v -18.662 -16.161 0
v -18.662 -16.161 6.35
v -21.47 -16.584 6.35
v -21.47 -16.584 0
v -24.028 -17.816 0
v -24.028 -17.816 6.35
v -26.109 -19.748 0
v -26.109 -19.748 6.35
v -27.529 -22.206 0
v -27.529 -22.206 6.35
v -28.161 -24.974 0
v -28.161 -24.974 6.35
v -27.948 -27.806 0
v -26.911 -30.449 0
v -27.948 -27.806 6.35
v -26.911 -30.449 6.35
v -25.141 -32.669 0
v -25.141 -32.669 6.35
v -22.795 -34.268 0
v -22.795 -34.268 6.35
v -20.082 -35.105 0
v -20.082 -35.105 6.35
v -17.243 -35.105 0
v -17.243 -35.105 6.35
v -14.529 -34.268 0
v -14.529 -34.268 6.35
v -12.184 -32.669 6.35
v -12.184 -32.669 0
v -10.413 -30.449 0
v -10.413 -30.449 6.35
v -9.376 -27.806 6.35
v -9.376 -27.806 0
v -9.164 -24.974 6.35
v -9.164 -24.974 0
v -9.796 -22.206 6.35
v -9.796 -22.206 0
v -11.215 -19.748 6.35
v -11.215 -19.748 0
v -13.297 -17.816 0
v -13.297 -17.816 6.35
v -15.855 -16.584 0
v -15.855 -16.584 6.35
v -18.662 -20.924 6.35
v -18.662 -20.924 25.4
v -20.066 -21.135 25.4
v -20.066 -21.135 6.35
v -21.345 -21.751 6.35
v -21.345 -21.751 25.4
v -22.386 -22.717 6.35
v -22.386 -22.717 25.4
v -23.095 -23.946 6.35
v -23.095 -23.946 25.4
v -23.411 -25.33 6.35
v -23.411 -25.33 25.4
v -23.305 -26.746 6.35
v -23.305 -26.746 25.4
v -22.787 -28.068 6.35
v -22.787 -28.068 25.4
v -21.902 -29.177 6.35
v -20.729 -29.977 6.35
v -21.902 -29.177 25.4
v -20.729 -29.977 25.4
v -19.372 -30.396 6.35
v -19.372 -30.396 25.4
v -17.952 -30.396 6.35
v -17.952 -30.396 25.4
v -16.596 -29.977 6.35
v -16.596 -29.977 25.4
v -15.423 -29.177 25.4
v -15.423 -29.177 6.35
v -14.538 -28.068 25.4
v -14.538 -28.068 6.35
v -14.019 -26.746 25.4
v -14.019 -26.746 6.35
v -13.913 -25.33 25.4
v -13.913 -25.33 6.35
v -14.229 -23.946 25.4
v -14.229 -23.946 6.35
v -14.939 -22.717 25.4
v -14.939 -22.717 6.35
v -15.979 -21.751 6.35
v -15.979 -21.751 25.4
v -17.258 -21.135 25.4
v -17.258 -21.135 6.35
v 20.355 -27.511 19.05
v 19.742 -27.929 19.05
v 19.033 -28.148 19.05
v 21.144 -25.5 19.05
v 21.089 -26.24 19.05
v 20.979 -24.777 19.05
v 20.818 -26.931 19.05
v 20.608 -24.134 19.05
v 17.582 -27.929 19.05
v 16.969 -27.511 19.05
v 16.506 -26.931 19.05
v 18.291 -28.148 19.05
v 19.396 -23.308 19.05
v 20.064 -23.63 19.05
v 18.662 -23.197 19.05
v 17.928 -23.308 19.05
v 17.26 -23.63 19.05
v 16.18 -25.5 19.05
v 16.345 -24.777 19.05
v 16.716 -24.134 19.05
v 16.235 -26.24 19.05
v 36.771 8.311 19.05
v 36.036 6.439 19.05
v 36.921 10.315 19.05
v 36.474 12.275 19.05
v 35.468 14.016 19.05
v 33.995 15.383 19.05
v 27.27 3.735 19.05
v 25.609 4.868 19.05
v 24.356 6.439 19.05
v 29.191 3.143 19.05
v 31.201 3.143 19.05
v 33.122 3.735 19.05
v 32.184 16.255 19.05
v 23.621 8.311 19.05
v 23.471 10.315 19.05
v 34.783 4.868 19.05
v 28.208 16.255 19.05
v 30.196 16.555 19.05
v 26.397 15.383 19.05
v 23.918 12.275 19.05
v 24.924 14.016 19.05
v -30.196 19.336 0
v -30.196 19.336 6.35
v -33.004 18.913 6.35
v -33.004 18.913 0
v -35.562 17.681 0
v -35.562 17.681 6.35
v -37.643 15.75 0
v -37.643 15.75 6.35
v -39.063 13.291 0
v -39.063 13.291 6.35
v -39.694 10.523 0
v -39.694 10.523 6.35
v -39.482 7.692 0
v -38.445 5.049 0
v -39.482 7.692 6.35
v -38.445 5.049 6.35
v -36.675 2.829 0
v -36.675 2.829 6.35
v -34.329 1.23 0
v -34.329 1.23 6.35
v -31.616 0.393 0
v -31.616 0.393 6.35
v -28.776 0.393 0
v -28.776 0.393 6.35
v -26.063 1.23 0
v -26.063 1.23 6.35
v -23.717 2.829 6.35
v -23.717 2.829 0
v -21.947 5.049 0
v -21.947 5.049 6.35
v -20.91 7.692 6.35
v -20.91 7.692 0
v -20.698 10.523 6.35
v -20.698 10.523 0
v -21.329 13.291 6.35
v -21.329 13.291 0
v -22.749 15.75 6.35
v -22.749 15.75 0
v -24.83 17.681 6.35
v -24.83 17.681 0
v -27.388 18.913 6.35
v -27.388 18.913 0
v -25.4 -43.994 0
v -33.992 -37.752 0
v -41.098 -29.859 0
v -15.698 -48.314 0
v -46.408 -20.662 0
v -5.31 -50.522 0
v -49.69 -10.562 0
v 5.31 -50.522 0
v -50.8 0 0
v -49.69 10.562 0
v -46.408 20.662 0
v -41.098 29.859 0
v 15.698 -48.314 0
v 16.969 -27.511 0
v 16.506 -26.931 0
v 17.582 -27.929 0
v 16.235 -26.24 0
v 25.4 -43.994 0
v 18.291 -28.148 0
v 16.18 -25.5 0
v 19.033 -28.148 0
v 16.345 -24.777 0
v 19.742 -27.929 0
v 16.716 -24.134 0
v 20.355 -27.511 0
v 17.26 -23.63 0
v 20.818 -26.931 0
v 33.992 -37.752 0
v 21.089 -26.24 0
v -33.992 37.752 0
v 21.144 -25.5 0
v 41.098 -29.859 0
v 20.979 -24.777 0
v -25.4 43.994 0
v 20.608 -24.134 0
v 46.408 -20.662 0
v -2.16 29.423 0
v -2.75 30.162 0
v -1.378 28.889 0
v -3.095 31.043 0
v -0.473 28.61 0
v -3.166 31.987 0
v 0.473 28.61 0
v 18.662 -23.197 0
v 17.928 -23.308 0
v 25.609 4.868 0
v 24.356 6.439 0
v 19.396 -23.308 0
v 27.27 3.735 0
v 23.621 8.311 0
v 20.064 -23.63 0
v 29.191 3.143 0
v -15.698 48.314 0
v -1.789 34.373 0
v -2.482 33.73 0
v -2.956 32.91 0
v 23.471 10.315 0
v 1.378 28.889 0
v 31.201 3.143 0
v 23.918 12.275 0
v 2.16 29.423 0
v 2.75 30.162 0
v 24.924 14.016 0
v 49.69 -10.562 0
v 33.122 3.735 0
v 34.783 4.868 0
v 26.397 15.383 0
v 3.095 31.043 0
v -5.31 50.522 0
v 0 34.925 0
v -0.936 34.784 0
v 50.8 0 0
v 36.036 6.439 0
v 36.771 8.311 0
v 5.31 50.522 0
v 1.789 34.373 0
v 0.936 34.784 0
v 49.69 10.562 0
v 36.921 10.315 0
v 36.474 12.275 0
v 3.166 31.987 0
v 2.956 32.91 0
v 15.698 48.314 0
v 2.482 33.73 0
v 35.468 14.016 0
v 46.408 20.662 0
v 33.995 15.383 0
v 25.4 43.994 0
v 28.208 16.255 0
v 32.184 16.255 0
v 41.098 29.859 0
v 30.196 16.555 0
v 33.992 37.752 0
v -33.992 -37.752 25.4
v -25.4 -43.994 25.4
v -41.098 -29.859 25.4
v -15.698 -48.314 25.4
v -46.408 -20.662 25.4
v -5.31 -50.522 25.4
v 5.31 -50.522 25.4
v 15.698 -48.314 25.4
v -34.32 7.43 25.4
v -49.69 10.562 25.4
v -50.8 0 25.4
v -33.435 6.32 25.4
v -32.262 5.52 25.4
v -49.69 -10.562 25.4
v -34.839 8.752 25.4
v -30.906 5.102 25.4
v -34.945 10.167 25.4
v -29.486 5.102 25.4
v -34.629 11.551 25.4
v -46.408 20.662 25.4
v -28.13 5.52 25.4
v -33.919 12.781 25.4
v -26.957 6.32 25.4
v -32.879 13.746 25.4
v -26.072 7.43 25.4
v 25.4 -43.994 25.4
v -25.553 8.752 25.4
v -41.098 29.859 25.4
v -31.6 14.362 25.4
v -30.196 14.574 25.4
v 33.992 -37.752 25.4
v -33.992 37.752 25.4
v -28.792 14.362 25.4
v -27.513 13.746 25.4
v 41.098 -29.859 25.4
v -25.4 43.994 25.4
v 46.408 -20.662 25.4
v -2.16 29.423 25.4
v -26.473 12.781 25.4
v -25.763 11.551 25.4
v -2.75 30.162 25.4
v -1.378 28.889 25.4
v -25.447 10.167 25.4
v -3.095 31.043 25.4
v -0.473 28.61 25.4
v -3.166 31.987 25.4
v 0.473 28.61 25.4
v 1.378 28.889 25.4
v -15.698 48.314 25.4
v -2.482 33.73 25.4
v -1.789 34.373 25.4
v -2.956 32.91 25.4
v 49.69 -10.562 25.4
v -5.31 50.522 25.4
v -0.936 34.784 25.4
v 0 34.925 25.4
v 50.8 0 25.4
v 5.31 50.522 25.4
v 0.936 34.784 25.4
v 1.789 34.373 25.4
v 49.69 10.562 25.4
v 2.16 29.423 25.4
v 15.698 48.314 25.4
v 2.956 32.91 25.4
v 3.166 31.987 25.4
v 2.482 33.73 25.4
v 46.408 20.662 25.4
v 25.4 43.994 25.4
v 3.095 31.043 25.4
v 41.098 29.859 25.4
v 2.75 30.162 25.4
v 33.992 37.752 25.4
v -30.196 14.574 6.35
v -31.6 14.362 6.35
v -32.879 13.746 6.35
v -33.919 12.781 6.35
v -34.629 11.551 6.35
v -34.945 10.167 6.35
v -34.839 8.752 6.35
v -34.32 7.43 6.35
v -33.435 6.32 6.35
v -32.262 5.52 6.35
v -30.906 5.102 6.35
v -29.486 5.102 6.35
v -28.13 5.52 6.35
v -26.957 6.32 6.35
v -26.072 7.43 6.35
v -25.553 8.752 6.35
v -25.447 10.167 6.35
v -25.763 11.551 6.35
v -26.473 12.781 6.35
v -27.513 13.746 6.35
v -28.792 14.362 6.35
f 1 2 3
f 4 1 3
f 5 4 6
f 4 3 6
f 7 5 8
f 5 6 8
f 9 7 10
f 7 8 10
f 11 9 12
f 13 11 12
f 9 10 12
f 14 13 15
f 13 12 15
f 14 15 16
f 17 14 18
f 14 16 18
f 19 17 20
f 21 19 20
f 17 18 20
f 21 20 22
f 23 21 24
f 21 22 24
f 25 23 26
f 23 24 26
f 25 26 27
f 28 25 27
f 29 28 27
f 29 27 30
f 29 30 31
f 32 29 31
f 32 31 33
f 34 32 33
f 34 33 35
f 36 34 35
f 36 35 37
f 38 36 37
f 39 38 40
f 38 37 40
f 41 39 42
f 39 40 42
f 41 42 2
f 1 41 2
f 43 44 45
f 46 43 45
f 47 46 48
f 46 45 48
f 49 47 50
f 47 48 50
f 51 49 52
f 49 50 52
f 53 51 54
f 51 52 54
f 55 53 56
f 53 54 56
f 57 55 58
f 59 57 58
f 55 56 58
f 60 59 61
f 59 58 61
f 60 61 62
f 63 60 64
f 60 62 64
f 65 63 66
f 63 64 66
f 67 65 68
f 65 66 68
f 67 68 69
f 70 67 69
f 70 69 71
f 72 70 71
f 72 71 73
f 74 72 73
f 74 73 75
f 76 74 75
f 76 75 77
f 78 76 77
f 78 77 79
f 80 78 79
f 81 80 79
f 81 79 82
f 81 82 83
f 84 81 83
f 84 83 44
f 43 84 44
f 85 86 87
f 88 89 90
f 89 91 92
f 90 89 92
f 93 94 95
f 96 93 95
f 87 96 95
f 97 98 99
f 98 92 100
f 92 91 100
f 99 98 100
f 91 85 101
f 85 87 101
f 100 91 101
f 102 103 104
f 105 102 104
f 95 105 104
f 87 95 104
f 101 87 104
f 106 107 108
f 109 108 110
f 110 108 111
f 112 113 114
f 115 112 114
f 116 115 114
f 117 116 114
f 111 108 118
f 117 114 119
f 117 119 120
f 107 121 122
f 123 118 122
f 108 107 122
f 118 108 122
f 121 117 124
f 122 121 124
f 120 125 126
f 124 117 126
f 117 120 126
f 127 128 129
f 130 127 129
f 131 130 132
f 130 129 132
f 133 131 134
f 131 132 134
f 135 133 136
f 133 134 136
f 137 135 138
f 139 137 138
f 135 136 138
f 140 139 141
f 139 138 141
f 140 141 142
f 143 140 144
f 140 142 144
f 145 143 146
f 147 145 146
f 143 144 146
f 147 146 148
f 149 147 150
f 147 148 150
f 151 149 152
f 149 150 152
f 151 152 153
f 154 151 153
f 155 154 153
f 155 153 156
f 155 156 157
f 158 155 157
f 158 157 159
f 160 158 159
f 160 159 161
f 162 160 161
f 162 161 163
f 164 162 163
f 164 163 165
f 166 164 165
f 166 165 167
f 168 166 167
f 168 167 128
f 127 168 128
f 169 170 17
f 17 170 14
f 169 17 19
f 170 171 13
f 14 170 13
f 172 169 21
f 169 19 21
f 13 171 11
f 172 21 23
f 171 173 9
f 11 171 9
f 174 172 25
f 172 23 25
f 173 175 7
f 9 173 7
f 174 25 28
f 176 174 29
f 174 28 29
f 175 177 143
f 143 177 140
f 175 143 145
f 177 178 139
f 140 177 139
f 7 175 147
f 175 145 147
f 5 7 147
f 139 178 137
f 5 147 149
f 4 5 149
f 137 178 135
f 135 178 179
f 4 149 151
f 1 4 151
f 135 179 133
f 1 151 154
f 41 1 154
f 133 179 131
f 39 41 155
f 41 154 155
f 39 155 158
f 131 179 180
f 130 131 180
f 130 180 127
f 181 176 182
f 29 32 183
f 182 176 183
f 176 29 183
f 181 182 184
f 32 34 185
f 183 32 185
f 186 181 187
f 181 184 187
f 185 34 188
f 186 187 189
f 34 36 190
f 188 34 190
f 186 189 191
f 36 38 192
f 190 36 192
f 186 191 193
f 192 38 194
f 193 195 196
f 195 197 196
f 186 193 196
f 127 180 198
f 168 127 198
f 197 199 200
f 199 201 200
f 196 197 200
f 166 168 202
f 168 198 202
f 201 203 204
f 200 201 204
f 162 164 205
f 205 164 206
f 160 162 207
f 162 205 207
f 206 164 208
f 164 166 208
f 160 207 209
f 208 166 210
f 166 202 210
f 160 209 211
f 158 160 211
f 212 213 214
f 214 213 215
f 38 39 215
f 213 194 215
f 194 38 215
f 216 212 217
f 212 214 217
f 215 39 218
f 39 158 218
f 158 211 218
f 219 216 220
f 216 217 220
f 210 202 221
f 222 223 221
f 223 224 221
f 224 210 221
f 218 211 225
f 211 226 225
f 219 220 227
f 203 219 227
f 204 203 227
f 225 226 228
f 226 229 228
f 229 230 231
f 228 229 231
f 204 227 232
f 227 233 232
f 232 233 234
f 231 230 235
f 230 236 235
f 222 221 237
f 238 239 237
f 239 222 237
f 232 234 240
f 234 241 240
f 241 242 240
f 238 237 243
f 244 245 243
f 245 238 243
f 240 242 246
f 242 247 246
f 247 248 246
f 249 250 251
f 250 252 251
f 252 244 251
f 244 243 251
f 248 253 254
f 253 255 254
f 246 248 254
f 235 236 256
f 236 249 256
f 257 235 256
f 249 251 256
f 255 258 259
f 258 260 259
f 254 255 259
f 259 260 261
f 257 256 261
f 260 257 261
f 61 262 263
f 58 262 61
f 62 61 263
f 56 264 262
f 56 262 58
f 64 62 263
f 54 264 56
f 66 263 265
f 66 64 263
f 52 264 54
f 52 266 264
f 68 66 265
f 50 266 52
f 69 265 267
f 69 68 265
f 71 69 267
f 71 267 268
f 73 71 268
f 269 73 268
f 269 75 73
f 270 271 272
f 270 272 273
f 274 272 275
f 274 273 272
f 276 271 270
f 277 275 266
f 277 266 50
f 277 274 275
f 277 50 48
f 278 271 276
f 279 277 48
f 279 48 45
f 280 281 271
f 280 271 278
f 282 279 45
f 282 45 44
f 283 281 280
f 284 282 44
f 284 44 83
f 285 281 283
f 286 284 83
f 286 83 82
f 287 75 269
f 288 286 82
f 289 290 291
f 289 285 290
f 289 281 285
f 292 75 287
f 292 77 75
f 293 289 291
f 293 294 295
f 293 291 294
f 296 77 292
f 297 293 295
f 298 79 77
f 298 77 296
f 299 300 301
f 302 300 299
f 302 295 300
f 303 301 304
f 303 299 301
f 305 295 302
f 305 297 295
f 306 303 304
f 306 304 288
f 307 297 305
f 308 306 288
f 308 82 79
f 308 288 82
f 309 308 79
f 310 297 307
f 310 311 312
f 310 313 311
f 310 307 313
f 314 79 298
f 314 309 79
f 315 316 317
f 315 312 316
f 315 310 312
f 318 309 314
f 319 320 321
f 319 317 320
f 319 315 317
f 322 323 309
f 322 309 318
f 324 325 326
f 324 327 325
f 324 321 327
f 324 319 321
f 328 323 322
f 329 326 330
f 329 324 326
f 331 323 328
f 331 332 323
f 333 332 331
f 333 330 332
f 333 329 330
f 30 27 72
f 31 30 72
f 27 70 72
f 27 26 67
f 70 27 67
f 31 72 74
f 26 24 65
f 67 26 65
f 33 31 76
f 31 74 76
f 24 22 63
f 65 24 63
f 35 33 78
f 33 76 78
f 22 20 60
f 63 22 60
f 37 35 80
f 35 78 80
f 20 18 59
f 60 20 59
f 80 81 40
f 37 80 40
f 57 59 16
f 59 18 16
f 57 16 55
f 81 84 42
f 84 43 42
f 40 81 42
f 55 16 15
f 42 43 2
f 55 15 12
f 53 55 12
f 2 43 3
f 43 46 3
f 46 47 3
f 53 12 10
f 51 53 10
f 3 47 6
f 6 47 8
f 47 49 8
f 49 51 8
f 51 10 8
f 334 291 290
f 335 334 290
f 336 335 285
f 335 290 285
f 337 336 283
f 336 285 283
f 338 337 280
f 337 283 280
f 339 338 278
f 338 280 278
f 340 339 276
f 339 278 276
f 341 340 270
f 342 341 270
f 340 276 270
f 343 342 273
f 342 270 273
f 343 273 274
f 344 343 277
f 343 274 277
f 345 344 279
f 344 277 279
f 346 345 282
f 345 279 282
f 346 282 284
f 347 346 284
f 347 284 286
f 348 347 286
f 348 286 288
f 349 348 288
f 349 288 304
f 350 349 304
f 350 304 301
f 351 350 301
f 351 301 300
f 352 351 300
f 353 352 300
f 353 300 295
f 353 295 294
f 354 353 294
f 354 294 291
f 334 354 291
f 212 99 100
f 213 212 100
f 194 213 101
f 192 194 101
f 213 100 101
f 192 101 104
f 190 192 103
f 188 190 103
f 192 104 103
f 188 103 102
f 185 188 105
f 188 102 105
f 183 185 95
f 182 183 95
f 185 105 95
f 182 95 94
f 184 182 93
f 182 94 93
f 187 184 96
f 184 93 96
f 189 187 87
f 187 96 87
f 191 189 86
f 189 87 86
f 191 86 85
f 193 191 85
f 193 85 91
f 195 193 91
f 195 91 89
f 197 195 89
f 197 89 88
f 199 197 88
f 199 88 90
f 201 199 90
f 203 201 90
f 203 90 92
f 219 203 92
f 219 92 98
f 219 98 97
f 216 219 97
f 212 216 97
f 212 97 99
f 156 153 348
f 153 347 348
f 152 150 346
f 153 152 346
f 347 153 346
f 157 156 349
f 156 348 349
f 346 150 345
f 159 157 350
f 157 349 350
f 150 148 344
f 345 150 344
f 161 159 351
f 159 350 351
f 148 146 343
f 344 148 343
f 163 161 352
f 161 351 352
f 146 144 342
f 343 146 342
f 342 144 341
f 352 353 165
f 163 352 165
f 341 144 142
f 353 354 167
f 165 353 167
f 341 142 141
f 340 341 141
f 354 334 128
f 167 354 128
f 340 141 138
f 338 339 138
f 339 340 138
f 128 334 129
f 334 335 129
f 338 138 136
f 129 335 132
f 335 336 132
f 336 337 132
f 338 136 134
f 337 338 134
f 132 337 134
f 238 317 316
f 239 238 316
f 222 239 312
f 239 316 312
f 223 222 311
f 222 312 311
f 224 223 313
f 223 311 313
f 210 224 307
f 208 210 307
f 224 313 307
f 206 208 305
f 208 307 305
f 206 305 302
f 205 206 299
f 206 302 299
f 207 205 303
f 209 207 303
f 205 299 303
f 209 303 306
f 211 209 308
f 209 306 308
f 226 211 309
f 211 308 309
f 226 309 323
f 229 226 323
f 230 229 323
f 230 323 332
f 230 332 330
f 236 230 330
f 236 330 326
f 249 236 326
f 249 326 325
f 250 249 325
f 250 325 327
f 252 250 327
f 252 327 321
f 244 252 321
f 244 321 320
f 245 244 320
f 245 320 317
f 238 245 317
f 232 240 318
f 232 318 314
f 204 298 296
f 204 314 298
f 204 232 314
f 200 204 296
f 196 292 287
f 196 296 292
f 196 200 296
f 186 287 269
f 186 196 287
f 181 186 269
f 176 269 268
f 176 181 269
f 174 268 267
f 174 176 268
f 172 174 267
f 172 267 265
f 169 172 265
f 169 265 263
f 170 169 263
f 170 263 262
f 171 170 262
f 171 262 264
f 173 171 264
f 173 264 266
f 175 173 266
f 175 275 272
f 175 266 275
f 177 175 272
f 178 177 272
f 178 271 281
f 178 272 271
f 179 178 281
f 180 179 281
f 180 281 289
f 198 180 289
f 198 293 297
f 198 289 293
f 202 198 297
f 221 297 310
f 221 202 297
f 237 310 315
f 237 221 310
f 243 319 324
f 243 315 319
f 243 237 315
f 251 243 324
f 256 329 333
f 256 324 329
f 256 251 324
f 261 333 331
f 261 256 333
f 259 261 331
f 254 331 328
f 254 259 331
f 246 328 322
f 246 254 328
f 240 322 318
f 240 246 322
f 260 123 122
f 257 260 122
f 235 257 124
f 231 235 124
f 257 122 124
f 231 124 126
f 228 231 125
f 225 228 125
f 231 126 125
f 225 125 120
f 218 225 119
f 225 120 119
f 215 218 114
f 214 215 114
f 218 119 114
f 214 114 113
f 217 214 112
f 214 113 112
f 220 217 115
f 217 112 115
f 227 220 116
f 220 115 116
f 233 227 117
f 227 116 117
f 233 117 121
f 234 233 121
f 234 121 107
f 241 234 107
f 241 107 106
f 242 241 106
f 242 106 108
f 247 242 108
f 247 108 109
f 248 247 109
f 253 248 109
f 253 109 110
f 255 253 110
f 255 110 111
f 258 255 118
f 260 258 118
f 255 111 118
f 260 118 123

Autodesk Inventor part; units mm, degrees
ref_plane "YZ Plane" through (0, 0, 0) normal (1, 0, 0) x (0, 1, 0)
ref_plane "XZ Plane" through (0, 0, 0) normal (0, 1, 0) x (-1, 0, 0)
ref_plane "XY Plane" through (0, 0, 0) normal (0, 0, 1) x (1, 0, 0)
sketch "Sketch1" plane through (0, 0, 0) normal (0, 0, 1) x (1, 0, 0)
  circle A0 centre (0, 0) radius 50.8
  circle A1 centre (0, 0) radius 31.75
  dimension "d0" = 101.6
  dimension "d1" = 63.5
extrude "Extrusion2" add sketch "Sketch1" along normal blind 25.4 contours A0 | A1
sketch "Sketch4" plane through (0, 0, 0) normal (0, 0, -1) x (-1, 0, 0)
  point P0 (0, 0)
  point P1 (0, 31.75)
  point P2 (-30.196, 9.8113)
  point P3 (0, 0)
  point P4 (-18.6622, -25.6863)
  point P5 (0, 0)
  point P6 (18.6622, -25.6863)
  point P7 (0, 0)
  point P8 (30.196, 9.8113)
  point P9 (0, 0)
  dimension "d12" = 31.75
  dimension "d15" = 360
hole "Hole1" at (0, 31.75, 0) direction (0, 0, 1) diameter 6.35 end through all
hole "Hole2" at (-30.196, 9.8113, 0) at (-18.6622, -25.6863, 0) direction (0, 0, 1) diameter 9.525 end through all counterbore diameter 19.05 counterbore depth 6.35
hole "Hole3" at (18.6622, -25.6863, 0) direction (0, 0, 1) diameter 4.9784 depth 19.05 thread size "1/4-20 UNC" class "1B" standard "ANSI Unified Screw Threads"
hole "Hole4" at (30.196, 9.8113, 0) direction (0, 0, 1) diameter 13.4874 depth 19.05 clearance for "Hex Head Bolt" size "1/2" standard "Ansi Unified Screw Threads"
equation "\"d22\" = d12"
equation "\"d29\" = d12"
properties part number "ArthurW5.5aHoles"
